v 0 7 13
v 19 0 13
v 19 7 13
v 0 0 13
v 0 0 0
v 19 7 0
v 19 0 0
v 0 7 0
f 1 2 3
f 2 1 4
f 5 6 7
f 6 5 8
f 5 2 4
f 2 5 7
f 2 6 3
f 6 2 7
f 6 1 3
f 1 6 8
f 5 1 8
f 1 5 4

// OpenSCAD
// Generated by SolidPython 1.0.1 on 2020-07-29 00:46:56


cube(size = [19, 7, 13]);
/***********************************************
*********      SolidPython code:      **********
************************************************
 
# import packages: SolidPython
from solid import *
from solid.utils import *
from itertools import chain, combinations, permutations


class Resize:

    def __init__(self, scad_file):
        self.scad_file = scad_file
        #self.scad_file = import_scad(scad_file)
        # cone/cylinder param:
        self.r1 = 0
        self.r2 = 0
        self.h = 0
        # rectangular prism param:
        self.w = 0
        self.l = 0
        # ellipse param:
        self.r = 0

    # import OpenScad code (file name corresponds to shape)


    # classify shape + parameters
    def assign(self, param1, param2, param3):
        if self.scad_file == 'cone.scad':
            self.r1 = param1
            self.r2 = param2
            self.h = param3
        elif self.scad_file == 'cylinder.scad':
            self.r1 = param1
            self.r2 = param2
            self.h = param3
        elif self.scad_file == 'rectangularPrism.scad':
            self.h = param1
            self.l = param2
            self.w = param3
        else:
            self.r = param1
            self.h = param2

    # resize parameters
    def iterate(self):
        x = range(3, 20, 2)
        i = 1
        if self.scad_file == 'cone.scad':
            tempList = list(permutations(x, 2))
            for temp in tempList:
                param1 = temp[0]
                param2 = temp[1]
                filepath = 'produced_scad_files/' + 'cone' + str(param1) + '_' + str(param2) + '_' + '.scad'
                scad_render_to_file(cylinder(h=param1, r1=param2, r2=0), filepath)

        elif self.scad_file == 'cylinder.scad':
            tempList = list(permutations(x, 3))
            for temp in tempList:
                param1 = temp[0]
                param2 = temp[1]
                filepath = 'produced_scad_files/' + 'cylinder' + str(param1) + '_' + str(param2) + '_' + '.scad'
                scad_render_to_file(cylinder(h=param1, r1=param2, r2=param2), filepath)

        elif self.scad_file == 'rectangularPrism.scad':
            tempList = list(permutations(x, 3))
            for temp in tempList:
                param1 = temp[0]
                param2 = temp[1]
                param3 = temp[2]
                filepath = 'produced_scad_files/' + 'rectangularPrism' + str(param1) + '_' + str(param2) + '_' + str(
                    param3) + '.scad'
                scad_render_to_file(cube(size=(param1, param2, param3)), filepath)

        elif self.scad_file == 'ellipse.scad':
            tempList = list(permutations(x, 4))
            for temp in tempList:
                param1 = temp[0]
                param2 = temp[1]
                param3 = temp[2]
                param4 = temp[3]
                filepath = 'produced_scad_files/' + 'ellipse' + str(param1) + '_' + str(param2) + '_' + str(param3) + '_' + str(param4) + '.scad'
                scad_render_to_file(scale([param1, param2, param3])(sphere(r=param4)), filepath)

    def render_to_scadfile(self):
        scad_render_to_file(scad, 'example.scad') 
 
************************************************/
